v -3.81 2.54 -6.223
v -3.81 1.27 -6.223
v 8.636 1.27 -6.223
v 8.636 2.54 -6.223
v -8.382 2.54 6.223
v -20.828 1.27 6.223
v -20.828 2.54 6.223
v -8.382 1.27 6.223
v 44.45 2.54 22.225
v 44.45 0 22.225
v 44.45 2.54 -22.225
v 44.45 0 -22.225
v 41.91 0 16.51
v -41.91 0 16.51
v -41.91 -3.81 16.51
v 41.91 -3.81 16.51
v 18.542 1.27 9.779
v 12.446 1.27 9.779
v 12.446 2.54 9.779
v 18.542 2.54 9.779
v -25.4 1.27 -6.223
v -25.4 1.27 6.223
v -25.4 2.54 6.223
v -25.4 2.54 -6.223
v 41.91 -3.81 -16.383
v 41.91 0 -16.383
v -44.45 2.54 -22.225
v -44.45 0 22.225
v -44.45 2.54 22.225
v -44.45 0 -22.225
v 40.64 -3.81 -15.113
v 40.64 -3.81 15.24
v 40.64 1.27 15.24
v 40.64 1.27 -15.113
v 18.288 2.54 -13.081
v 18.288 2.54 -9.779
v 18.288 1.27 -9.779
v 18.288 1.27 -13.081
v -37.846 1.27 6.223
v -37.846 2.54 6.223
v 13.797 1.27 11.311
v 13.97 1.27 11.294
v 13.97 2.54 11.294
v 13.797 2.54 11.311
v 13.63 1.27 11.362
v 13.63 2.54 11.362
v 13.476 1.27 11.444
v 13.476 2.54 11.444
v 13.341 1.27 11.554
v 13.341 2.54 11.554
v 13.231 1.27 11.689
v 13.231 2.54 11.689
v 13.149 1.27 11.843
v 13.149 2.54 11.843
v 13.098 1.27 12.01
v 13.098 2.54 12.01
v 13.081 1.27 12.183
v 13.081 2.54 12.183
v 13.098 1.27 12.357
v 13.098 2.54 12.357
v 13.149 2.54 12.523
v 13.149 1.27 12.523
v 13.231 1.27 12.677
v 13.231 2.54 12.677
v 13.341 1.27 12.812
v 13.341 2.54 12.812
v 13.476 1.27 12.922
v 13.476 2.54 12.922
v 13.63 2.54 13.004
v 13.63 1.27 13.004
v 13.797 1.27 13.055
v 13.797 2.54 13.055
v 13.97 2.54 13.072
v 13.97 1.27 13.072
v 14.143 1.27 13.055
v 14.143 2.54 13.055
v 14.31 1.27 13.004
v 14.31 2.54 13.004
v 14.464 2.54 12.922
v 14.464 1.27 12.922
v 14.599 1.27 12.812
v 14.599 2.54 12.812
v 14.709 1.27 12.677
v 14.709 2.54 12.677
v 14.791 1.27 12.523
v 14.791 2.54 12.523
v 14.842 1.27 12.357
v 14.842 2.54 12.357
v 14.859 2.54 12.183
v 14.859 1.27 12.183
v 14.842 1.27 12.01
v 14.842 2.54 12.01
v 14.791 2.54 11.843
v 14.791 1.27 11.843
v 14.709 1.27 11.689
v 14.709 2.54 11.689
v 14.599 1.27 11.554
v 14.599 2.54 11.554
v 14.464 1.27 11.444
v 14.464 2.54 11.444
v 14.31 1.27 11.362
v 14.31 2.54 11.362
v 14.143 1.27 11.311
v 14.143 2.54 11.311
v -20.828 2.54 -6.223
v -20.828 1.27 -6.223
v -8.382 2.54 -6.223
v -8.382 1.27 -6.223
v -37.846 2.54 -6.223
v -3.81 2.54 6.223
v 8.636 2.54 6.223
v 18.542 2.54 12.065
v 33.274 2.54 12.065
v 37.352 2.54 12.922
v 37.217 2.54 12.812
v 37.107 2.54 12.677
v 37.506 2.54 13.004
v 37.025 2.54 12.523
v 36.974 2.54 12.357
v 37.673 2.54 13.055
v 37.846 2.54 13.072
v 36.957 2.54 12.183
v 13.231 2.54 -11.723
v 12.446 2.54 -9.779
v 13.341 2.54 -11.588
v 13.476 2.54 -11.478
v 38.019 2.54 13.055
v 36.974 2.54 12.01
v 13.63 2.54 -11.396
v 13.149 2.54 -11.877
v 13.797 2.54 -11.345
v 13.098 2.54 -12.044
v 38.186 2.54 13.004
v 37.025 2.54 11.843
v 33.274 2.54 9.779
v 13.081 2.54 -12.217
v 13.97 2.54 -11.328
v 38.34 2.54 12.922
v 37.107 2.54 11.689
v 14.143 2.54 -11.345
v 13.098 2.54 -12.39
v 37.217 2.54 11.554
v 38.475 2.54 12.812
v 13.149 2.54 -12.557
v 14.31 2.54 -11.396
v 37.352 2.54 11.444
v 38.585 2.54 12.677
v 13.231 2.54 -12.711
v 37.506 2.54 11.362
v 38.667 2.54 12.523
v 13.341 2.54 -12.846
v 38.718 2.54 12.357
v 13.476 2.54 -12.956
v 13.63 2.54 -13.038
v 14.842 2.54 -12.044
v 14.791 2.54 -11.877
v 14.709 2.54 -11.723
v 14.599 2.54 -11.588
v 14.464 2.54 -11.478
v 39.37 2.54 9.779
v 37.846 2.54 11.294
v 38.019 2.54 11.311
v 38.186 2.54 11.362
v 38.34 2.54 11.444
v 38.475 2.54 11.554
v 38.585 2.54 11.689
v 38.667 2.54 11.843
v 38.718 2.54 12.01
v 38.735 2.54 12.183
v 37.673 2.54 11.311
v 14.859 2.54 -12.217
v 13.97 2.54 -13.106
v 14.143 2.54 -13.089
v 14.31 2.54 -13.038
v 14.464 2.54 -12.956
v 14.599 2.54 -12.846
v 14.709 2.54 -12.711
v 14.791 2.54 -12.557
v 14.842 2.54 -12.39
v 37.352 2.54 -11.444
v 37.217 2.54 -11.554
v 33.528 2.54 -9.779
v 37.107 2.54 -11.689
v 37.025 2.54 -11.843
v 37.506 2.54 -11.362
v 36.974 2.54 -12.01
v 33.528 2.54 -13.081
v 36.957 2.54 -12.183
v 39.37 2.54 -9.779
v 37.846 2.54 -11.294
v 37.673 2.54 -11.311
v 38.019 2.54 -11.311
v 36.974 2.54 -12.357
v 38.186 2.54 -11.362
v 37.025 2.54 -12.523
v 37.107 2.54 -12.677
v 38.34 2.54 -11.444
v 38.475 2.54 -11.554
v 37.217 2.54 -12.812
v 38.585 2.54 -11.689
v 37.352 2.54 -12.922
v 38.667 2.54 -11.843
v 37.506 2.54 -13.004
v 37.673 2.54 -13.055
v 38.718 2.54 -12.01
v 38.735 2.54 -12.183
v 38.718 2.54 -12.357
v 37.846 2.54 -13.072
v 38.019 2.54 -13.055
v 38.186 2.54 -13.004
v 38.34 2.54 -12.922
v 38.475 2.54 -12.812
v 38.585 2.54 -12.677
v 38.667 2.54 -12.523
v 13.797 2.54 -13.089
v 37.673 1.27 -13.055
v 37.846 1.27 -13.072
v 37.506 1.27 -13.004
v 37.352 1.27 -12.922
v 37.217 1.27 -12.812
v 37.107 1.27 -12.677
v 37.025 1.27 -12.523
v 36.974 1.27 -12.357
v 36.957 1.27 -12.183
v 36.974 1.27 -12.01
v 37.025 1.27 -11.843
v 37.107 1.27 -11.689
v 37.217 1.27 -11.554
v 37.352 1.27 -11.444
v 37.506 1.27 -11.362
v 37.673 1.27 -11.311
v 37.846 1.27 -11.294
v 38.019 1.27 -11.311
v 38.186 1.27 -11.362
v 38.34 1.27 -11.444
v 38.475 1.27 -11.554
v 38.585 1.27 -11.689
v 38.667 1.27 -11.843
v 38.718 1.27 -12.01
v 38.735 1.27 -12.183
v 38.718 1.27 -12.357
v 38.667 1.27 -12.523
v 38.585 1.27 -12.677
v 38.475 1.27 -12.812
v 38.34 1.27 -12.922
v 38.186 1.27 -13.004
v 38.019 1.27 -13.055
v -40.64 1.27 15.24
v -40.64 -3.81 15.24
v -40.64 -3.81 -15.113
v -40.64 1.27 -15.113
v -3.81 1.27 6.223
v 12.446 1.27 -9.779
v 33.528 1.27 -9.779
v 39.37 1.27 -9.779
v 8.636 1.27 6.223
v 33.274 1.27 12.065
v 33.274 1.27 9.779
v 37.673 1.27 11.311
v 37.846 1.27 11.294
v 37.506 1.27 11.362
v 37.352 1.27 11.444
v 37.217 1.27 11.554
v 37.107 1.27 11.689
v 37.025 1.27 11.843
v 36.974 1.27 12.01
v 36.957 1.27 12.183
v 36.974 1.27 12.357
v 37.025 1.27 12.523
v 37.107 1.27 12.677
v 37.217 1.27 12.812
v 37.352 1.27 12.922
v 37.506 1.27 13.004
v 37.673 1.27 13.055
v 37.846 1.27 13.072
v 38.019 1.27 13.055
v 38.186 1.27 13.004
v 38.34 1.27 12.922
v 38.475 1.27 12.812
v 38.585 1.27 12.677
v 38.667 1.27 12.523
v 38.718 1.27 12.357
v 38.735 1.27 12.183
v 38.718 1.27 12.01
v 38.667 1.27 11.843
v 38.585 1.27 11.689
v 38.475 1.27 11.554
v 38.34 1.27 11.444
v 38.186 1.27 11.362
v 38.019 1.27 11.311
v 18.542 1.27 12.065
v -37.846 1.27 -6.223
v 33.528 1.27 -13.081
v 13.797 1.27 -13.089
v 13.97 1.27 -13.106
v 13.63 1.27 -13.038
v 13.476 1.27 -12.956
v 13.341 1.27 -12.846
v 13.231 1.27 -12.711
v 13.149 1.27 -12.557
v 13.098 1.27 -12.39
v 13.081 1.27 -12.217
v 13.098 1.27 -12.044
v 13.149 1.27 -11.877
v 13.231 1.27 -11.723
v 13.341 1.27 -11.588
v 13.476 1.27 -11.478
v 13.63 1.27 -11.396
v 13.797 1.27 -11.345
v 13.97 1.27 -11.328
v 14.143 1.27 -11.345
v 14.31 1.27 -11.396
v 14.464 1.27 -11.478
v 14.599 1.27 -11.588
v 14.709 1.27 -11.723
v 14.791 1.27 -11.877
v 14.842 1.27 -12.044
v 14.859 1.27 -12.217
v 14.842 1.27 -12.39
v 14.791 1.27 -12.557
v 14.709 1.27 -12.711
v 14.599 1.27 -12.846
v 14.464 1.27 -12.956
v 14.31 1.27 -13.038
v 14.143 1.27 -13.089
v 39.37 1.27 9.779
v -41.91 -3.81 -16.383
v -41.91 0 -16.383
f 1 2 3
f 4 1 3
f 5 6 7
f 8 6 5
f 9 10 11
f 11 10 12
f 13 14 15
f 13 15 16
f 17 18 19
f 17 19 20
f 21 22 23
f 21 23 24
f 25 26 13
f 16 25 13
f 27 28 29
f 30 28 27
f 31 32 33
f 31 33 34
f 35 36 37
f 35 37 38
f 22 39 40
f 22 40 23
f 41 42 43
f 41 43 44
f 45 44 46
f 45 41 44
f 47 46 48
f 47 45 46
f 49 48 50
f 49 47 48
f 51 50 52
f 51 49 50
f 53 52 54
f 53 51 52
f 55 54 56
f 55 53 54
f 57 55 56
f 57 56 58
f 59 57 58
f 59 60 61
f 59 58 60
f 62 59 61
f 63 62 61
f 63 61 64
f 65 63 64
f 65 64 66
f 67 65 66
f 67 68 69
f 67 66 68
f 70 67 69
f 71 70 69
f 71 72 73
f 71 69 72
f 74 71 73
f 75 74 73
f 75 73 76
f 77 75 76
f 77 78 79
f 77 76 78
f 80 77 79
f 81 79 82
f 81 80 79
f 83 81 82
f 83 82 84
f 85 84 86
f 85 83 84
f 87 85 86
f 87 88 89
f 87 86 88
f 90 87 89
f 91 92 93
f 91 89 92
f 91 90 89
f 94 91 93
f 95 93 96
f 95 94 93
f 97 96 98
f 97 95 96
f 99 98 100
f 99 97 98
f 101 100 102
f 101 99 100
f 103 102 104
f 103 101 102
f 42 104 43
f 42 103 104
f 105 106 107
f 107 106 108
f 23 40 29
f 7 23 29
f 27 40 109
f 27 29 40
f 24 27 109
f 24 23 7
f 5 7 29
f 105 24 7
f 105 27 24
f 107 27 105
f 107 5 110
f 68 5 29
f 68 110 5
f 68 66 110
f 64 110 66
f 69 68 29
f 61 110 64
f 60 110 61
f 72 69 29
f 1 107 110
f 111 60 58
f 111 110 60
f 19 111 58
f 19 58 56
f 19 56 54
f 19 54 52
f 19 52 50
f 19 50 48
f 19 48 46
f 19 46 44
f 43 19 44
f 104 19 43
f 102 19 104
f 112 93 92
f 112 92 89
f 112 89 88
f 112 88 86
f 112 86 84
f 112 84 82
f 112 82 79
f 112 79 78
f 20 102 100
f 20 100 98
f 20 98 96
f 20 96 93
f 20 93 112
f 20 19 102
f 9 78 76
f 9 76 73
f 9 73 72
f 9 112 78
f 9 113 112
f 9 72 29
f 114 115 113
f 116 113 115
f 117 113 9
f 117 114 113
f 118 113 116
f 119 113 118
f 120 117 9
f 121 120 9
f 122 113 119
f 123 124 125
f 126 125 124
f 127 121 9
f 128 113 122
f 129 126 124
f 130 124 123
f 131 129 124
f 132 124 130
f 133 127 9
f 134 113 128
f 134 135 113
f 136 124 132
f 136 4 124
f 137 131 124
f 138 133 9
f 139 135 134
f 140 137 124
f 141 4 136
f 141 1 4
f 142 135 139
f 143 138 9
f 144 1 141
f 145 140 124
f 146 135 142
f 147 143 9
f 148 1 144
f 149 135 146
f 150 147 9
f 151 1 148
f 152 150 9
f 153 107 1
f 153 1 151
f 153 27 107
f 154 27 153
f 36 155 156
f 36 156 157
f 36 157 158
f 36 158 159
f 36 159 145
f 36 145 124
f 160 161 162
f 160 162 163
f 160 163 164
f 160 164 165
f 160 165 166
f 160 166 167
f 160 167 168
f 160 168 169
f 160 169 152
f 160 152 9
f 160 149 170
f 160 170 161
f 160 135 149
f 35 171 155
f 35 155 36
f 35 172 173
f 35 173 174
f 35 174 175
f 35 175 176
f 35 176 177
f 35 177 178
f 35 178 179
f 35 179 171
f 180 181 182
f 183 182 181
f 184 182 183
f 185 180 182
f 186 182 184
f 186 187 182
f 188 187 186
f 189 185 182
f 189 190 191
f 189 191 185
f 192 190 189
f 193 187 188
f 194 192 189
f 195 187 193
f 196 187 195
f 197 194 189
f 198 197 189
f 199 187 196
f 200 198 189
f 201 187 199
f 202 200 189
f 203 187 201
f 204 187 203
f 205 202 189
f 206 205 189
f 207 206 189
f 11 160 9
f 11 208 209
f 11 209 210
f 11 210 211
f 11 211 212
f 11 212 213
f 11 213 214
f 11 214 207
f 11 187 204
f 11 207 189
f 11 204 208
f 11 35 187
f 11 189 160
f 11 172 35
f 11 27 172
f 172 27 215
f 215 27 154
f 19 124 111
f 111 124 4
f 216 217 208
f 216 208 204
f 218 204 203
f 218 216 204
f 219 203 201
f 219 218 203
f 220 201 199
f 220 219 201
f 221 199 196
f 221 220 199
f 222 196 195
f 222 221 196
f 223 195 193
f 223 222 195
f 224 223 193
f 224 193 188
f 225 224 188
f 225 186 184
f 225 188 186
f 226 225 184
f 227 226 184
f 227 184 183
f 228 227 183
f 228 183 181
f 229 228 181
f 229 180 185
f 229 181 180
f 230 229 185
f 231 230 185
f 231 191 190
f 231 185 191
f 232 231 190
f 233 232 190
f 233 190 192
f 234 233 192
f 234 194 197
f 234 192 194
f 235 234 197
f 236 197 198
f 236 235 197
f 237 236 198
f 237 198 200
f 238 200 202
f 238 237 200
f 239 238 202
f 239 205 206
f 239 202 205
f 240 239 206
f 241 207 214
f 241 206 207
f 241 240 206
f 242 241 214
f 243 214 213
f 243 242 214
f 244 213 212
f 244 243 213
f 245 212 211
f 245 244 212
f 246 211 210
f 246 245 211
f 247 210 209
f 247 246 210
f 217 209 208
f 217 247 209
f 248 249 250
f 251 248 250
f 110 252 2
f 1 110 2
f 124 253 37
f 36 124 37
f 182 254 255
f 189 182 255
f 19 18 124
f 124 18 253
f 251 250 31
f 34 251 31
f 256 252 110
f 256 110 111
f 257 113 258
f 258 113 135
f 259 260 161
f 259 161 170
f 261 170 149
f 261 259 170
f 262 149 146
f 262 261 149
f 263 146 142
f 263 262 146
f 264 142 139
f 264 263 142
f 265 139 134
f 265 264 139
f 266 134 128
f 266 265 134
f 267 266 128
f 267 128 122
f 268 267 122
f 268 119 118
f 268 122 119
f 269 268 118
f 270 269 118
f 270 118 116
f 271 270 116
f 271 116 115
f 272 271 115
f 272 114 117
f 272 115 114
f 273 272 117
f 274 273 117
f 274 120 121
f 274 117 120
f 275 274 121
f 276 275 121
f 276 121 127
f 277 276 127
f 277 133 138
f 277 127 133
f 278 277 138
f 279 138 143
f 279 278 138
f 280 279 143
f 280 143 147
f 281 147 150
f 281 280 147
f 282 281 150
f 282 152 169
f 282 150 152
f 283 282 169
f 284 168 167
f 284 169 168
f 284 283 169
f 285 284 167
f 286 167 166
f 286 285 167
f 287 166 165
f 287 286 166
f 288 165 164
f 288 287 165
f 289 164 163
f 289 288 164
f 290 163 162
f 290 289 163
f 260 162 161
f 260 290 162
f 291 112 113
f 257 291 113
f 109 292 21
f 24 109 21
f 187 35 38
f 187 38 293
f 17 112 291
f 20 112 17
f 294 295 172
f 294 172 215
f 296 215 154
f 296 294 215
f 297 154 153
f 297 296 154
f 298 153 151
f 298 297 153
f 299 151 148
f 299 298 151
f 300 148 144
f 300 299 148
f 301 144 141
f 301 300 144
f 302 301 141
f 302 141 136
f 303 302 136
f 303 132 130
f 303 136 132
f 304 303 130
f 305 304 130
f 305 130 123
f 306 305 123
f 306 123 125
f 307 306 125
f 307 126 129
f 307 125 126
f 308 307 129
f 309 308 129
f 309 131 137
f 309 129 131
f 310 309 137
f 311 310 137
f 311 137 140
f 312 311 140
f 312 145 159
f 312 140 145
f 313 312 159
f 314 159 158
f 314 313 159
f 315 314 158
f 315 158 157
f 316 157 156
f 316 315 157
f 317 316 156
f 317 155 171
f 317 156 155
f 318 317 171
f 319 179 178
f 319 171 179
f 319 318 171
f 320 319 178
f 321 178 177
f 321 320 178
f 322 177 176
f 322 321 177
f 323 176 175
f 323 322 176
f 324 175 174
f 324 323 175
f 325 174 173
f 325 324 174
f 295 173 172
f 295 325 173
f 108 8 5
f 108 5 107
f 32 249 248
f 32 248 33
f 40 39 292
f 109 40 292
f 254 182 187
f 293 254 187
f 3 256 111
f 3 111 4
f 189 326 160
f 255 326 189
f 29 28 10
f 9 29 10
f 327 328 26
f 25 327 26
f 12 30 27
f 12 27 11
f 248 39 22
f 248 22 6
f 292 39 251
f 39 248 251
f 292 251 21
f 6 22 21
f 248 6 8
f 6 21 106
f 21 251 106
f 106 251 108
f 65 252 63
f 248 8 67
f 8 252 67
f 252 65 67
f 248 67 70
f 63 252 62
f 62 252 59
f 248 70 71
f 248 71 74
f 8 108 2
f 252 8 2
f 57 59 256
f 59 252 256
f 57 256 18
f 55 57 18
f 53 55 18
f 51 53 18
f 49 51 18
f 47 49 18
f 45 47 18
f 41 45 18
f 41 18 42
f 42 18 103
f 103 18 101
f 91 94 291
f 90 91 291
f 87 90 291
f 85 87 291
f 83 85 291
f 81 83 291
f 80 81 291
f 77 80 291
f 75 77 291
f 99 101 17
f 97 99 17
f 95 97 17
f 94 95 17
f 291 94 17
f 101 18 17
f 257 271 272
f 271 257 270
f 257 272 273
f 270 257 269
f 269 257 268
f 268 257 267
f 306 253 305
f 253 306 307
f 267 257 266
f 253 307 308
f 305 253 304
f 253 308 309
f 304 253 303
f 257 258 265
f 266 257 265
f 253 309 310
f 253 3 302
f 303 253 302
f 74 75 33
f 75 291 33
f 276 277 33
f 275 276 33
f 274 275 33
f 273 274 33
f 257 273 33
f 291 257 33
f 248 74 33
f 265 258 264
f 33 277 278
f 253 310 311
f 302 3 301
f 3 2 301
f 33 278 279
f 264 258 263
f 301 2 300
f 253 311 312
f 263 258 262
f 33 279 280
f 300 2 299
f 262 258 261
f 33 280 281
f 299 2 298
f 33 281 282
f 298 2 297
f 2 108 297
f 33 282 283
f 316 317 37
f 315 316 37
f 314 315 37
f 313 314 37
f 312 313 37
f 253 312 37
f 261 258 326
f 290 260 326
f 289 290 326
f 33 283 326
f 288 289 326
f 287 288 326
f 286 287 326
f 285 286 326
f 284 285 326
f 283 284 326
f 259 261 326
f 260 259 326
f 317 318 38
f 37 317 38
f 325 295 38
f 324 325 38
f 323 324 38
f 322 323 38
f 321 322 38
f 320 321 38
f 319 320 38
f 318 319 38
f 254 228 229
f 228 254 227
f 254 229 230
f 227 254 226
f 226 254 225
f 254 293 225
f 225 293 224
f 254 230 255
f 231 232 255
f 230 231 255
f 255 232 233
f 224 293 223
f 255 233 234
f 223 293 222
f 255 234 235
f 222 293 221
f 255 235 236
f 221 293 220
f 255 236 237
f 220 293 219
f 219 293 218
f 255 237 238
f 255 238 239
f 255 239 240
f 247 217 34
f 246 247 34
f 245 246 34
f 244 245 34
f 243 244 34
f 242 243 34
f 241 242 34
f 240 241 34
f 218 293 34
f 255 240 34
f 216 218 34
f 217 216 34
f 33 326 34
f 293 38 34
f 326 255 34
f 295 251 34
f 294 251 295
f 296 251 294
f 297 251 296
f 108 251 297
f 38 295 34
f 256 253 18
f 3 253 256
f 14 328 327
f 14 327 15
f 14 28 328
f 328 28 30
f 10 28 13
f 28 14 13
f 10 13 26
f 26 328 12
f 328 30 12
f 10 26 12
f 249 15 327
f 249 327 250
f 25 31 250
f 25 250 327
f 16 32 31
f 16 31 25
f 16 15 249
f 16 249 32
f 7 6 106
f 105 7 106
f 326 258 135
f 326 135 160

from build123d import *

# Parameters (mm, degrees)
SKETCH2_W               = 88.9
SKETCH2_H               = 44.45
BOSS_EXTRUDE1_DEPTH     = 2.54
SKETCH5_W               = 83.82
SKETCH5_H               = 32.893
BOSS_EXTRUDE2_DEPTH     = 3.81
SHELL1_START            = -3.81
SHELL1_OUTLINE_W        = 81.28
SHELL1_OUTLINE_H        = 30.353
SHELL1_DEPTH            = 5.08
CUT_EXTRUDE1_DEPTH      = 51.100654936
CUT_EXTRUDE1_DEPTH_BACK = 51.100654936
SKETCH3_W               = 26.924
SKETCH3_H               = 19.558
CUT_EXTRUDE2_DEPTH      = 51.100654936
CUT_EXTRUDE2_DEPTH_BACK = 51.100654936
SKETCH4_W               = 12.446
SKETCH4_H               = 12.446
CUT_EXTRUDE3_DEPTH      = 51.100654936
CUT_EXTRUDE3_DEPTH_BACK = 2.54
SKETCH3_3_R             = 0.889
SKETCH6_W               = 14.732
SKETCH6_H               = 2.286
SKETCH6_W_2             = 15.24
SKETCH6_H_2             = 3.302
CUT_EXTRUDE4_DEPTH      = 2.54


# Read off the part's stored shape, not the designer's step: Shell1
with BuildPart() as part:
    # Sketch2 → Boss-Extrude1 (new body)
    with BuildSketch(Plane(origin=(0, 0, 0), x_dir=(1, 0, 0), z_dir=(0, 1, 0))):
        Rectangle(SKETCH2_W, SKETCH2_H)
    extrude(amount=BOSS_EXTRUDE1_DEPTH)

    # Sketch5 → Boss-Extrude2 (add)
    with BuildSketch(Plane.XZ):
        with Locations((0, 0.0635)):
            Rectangle(SKETCH5_W, SKETCH5_H)
    extrude(amount=BOSS_EXTRUDE2_DEPTH)

    # Shell1 outline → Shell1 (cut)
    with BuildSketch(Plane(origin=(0, 0, 0), x_dir=(1, 0, 0), z_dir=(0, 1, 0)).offset(SHELL1_START)):
        with Locations((0, -0.0635)):
            Rectangle(SHELL1_OUTLINE_W, SHELL1_OUTLINE_H)
    extrude(amount=SHELL1_DEPTH, mode=Mode.SUBTRACT)

    # Sketch3 → Cut-Extrude1 (cut, two sides: drawn at the far end of the back side and taken through both)
    with BuildSketch(Plane(origin=(0, 2.54, 0), x_dir=(1, 0, 0), z_dir=(0, 1, 0)).offset(-CUT_EXTRUDE1_DEPTH_BACK)):
        with Locations((25.908, 0)):
            Rectangle(SKETCH3_W, SKETCH3_H)
    extrude(amount=CUT_EXTRUDE1_DEPTH + CUT_EXTRUDE1_DEPTH_BACK, mode=Mode.SUBTRACT)

    # Sketch4 → Cut-Extrude2 (cut, two sides: drawn at the far end of the back side and taken through both)
    with BuildSketch(Plane(origin=(0, 2.54, 0), x_dir=(1, 0, 0), z_dir=(0, 1, 0)).offset(-CUT_EXTRUDE2_DEPTH_BACK)):
        with Locations((2.413, 0)):
            Rectangle(SKETCH4_W, SKETCH4_H)
        with Locations((-14.605, 0)):
            Rectangle(SKETCH4_W, SKETCH4_H)
        with Locations((-31.623, 0)):
            Rectangle(SKETCH4_W, SKETCH4_H)
    extrude(amount=CUT_EXTRUDE2_DEPTH + CUT_EXTRUDE2_DEPTH_BACK, mode=Mode.SUBTRACT)

    # Sketch3<3> → Cut-Extrude3 (cut, two sides: drawn at the far end of the back side and taken through both)
    with BuildSketch(Plane(origin=(0, 2.54, 0), x_dir=(1, 0, 0), z_dir=(0, 1, 0)).offset(-CUT_EXTRUDE3_DEPTH_BACK)):
        with Locations(Location((37.846, -12.183102804, 0), (0, 0, 90))):
            Circle(SKETCH3_3_R)
        with Locations(Location((13.97, -12.183102804, 0), (0, 0, 90))):
            Circle(SKETCH3_3_R)
        with Locations(Location((13.97, 12.217, 0), (0, 0, 90))):
            Circle(SKETCH3_3_R)
        with Locations(Location((37.846, 12.183102804, 0), (0, 0, 90))):
            Circle(SKETCH3_3_R)
    extrude(amount=CUT_EXTRUDE3_DEPTH + CUT_EXTRUDE3_DEPTH_BACK, mode=Mode.SUBTRACT)

    # Sketch6 → Cut-Extrude4 (cut)
    with BuildSketch(Plane(origin=(0, 2.54, 0), x_dir=(1, 0, 0), z_dir=(0, 1, 0))):
        with Locations((25.908, -10.922)):
            Rectangle(SKETCH6_W, SKETCH6_H)
        with Locations((25.908, 11.43)):
            Rectangle(SKETCH6_W_2, SKETCH6_H_2)
    extrude(amount=-CUT_EXTRUDE4_DEPTH, mode=Mode.SUBTRACT)


solid = part.part
